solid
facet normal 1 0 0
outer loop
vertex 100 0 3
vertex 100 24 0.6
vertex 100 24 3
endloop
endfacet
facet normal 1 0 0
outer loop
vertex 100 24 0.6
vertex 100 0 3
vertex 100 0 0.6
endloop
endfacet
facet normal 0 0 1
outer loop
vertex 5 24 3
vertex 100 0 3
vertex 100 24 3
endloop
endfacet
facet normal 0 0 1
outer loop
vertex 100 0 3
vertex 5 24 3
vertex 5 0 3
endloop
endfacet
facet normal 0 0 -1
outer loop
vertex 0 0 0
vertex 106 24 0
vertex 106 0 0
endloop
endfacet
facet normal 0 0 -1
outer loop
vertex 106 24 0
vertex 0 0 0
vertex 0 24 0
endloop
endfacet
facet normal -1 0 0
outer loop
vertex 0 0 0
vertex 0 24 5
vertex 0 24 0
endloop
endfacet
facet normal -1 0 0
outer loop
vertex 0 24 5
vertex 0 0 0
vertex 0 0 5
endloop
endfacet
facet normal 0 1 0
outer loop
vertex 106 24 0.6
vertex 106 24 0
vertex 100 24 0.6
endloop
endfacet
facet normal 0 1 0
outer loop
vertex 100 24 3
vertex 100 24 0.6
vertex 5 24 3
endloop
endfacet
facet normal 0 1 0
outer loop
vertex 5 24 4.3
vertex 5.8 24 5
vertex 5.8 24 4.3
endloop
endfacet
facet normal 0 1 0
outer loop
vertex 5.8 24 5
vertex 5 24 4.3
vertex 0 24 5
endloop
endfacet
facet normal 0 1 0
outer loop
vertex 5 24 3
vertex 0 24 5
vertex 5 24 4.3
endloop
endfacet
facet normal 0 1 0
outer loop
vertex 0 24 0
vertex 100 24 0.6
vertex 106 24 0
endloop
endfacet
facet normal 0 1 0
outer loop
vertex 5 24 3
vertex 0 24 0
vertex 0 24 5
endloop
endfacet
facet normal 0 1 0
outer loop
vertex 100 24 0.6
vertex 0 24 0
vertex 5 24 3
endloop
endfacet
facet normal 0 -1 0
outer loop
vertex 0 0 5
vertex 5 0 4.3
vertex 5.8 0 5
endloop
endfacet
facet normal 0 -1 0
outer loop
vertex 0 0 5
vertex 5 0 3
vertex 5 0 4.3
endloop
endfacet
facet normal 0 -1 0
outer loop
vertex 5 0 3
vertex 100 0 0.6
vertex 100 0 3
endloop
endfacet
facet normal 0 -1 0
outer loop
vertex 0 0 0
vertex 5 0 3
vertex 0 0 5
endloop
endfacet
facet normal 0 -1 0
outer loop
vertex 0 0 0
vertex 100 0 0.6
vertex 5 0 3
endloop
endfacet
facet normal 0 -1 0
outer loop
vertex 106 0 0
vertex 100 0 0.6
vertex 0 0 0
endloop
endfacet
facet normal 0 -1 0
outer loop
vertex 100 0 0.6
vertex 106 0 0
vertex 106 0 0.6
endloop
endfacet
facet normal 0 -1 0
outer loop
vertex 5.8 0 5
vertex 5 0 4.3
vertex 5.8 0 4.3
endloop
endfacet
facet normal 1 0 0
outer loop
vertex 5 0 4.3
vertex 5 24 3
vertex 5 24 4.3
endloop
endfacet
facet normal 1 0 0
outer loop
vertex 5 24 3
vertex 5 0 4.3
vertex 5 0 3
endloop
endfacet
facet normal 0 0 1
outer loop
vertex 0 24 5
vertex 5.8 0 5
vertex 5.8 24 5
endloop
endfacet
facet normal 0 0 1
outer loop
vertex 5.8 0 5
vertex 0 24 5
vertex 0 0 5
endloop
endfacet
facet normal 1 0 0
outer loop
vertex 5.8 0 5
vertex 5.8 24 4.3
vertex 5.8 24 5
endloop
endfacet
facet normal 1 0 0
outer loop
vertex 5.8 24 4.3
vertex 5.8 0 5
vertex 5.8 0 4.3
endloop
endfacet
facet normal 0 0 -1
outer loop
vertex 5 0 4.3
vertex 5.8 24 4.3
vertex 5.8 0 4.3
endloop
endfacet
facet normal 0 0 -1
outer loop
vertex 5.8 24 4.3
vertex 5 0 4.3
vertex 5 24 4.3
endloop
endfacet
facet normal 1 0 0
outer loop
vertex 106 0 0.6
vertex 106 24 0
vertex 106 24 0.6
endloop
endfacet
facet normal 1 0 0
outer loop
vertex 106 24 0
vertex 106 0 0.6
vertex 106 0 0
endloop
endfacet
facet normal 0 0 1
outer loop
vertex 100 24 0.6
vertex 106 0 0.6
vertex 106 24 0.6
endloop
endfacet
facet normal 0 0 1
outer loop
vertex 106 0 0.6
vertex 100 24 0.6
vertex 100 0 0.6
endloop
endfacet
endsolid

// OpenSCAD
/* Bag clip with living hinge - PETG, 0.4mm nozzle, no supports
   Printed open flat (single print, fuses into one piece), folds shut on 2mm folded bag.
   Two verification parts (lower + upper) that fuse at hinge when printed together.
   Assembly shows closed on bag, motion "closing" folds upper onto lower/bag.
*/
/* [Print] */
part = "lower"; // [lower, upper, assembly]

cadverify_only = "";
module instance(name, part, unit = 1) {
    echo(cadverify_instance = [name, part, unit]);
    if (cadverify_only == "" || cadverify_only == name) children();
}

// ---- parameters (mm) ----
arm_len = 100;
arm_w = 24;
arm_t = 3;
hinge_len = 6;
hinge_t = 0.6;
tab_len = 12;
heel_len = 8;
catch_w = 5;
lip = 0.8;
lip_t = 0.7;
bag_t = 2;

lower_xmax = 106;      // 0..106
upper_len_print = 112; // 0..112
closed_h = 8.2;
pivot_x = 103.05;
pivot_z = 4.1;

module lower_geo() {
    // base
    cube([100, arm_w, arm_t]);
    // catch block at free end (x 0..5), overlap into base
    translate([0, 0, 2.98]) cube([5, arm_w, 2.02]);
    // catch lip protruding +x, overlap into block
    translate([4.98, 0, 4.3]) cube([0.82, arm_w, 0.7]);
    // living hinge leaf, overlap into base
    translate([99.98, 0, 0]) cube([6.02, arm_w, hinge_t]);
}

module upper_geo() {
    // base 0..100
    cube([100, arm_w, arm_t]);
    // heel at hinge end on top
    translate([0, 0, 2.98]) cube([8, arm_w, 2.02]);
    // hook leg near free end on top
    translate([92.2, 0, 2.98]) cube([2, arm_w, 1.82]);
    // hook lip protruding +x from leg side
    translate([94.18, 0, 4.1]) cube([0.82, arm_w, 0.7]);
    // thumb tab extension beyond free end
    translate([99.98, 0, 0]) cube([12.02, arm_w, arm_t]);
}

module bag_geo() {
    translate([8, 0, 3]) cube([84, arm_w, bag_t]);
}

if (part == "lower") {
    echo(cadverify_spec = [
        ["bounds", [[0, 0, 0], [106, 24, 5]]],
        ["bodies", 1],
        ["through_holes", 0],
        ["support_faces", [["bed", "-z", 500]]],
        ["overhangs_allowed", [["catch lip bridge", [[4.5, 0, 4.0], [6.2, 24, 5.1]]]]],
        ["copies", 1],
        ["details", [
            ["base", "material", [[10, 0, 0], [90, 24, 3]], 1],
            ["catch", "material", [[0, 0, 3], [5, 24, 5]], 1],
            ["catch_lip", "material", [[5.0, 0.1, 4.35], [5.75, 23.9, 4.95]], 0.9],
            ["hinge", "material", [[100.05, 0.1, 0.05], [105.95, 23.9, 0.55]], 0.9],
            ["hook_space", "void", [[5.8, 0, 3], [8.6, 24, 5.4]], 1],
            ["bag_space", "void", [[8, 0, 5.1], [92, 24, 7]], 1],
            ["wall", "thickness", [50, 12, 6], [0, 0, -1], 3],
            ["film", "thickness", [103, 12, 2], [0, 0, -1], 0.6],
            ["hinge_top", "view", [[99, 0, 0], [107, 24, 1]]]
        ]]
    ]);
    lower_geo();
} else if (part == "upper") {
    echo(cadverify_spec = [
        ["bounds", [[0, 0, 0], [112, 24, 5]]],
        ["bodies", 1],
        ["through_holes", 0],
        ["support_faces", [["bed", "-z", 500]]],
        ["overhangs_allowed", [["hook lip bridge", [[91.5, 0, 2.8], [96, 24, 5]]]]],
        ["copies", 1],
        ["details", [
            ["heel", "material", [[0, 0, 3], [8, 24, 5]], 1],
            ["arm", "material", [[10, 0, 0], [80, 24, 3]], 1],
            ["hook_leg", "material", [[92.2, 0, 3], [94.2, 24, 4.8]], 1],
            ["hook_lip", "material", [[94.18, 0, 4.1], [95, 24, 4.8]], 1],
            ["tab", "material", [[100, 0, 0], [112, 24, 3]], 1],
            ["catch_space", "void", [[95, 0, 3], [99.9, 24, 5]], 1],
            ["wall", "thickness", [50, 12, 6], [0, 0, -1], 3],
            ["heel_wall", "thickness", [4, 12, 7], [0, 0, -1], 5],
            ["thumb", "view", [[99, 0, 0], [113, 24, 3.5]]]
        ]]
    ]);
    upper_geo();
} else if (part == "assembly") {
    echo(cadverify_spec = [
        ["bounds", [[-12, 0, 0], [106, 24, 8.2]]],
        ["support_faces", [["bed", "-z", 1000]]],
        ["motions", [
            ["closing", ["upper"], "rotate", [103.05, 12, 4.1], [0, 1, 0], [0, 180],
                ["flex", [["upper", "lower", 1, "latch snap and heel clearance"]]]]
        ]],
        ["assembly_order", [
            [[["lower"], [0, 0, 0]]],
            [[["bag"], [0, 0, -1]]],
            [[["upper"], [0, 0, -1], ["flex", [["upper", "lower", 1, "latch snap"]]]]]
        ]]
    ]);
    instance("lower", "lower") lower_geo();
    instance("upper", "upper") translate([100, 0, 8.2]) rotate([0, 180, 0]) upper_geo();
    instance("bag", "external") bag_geo();
}
